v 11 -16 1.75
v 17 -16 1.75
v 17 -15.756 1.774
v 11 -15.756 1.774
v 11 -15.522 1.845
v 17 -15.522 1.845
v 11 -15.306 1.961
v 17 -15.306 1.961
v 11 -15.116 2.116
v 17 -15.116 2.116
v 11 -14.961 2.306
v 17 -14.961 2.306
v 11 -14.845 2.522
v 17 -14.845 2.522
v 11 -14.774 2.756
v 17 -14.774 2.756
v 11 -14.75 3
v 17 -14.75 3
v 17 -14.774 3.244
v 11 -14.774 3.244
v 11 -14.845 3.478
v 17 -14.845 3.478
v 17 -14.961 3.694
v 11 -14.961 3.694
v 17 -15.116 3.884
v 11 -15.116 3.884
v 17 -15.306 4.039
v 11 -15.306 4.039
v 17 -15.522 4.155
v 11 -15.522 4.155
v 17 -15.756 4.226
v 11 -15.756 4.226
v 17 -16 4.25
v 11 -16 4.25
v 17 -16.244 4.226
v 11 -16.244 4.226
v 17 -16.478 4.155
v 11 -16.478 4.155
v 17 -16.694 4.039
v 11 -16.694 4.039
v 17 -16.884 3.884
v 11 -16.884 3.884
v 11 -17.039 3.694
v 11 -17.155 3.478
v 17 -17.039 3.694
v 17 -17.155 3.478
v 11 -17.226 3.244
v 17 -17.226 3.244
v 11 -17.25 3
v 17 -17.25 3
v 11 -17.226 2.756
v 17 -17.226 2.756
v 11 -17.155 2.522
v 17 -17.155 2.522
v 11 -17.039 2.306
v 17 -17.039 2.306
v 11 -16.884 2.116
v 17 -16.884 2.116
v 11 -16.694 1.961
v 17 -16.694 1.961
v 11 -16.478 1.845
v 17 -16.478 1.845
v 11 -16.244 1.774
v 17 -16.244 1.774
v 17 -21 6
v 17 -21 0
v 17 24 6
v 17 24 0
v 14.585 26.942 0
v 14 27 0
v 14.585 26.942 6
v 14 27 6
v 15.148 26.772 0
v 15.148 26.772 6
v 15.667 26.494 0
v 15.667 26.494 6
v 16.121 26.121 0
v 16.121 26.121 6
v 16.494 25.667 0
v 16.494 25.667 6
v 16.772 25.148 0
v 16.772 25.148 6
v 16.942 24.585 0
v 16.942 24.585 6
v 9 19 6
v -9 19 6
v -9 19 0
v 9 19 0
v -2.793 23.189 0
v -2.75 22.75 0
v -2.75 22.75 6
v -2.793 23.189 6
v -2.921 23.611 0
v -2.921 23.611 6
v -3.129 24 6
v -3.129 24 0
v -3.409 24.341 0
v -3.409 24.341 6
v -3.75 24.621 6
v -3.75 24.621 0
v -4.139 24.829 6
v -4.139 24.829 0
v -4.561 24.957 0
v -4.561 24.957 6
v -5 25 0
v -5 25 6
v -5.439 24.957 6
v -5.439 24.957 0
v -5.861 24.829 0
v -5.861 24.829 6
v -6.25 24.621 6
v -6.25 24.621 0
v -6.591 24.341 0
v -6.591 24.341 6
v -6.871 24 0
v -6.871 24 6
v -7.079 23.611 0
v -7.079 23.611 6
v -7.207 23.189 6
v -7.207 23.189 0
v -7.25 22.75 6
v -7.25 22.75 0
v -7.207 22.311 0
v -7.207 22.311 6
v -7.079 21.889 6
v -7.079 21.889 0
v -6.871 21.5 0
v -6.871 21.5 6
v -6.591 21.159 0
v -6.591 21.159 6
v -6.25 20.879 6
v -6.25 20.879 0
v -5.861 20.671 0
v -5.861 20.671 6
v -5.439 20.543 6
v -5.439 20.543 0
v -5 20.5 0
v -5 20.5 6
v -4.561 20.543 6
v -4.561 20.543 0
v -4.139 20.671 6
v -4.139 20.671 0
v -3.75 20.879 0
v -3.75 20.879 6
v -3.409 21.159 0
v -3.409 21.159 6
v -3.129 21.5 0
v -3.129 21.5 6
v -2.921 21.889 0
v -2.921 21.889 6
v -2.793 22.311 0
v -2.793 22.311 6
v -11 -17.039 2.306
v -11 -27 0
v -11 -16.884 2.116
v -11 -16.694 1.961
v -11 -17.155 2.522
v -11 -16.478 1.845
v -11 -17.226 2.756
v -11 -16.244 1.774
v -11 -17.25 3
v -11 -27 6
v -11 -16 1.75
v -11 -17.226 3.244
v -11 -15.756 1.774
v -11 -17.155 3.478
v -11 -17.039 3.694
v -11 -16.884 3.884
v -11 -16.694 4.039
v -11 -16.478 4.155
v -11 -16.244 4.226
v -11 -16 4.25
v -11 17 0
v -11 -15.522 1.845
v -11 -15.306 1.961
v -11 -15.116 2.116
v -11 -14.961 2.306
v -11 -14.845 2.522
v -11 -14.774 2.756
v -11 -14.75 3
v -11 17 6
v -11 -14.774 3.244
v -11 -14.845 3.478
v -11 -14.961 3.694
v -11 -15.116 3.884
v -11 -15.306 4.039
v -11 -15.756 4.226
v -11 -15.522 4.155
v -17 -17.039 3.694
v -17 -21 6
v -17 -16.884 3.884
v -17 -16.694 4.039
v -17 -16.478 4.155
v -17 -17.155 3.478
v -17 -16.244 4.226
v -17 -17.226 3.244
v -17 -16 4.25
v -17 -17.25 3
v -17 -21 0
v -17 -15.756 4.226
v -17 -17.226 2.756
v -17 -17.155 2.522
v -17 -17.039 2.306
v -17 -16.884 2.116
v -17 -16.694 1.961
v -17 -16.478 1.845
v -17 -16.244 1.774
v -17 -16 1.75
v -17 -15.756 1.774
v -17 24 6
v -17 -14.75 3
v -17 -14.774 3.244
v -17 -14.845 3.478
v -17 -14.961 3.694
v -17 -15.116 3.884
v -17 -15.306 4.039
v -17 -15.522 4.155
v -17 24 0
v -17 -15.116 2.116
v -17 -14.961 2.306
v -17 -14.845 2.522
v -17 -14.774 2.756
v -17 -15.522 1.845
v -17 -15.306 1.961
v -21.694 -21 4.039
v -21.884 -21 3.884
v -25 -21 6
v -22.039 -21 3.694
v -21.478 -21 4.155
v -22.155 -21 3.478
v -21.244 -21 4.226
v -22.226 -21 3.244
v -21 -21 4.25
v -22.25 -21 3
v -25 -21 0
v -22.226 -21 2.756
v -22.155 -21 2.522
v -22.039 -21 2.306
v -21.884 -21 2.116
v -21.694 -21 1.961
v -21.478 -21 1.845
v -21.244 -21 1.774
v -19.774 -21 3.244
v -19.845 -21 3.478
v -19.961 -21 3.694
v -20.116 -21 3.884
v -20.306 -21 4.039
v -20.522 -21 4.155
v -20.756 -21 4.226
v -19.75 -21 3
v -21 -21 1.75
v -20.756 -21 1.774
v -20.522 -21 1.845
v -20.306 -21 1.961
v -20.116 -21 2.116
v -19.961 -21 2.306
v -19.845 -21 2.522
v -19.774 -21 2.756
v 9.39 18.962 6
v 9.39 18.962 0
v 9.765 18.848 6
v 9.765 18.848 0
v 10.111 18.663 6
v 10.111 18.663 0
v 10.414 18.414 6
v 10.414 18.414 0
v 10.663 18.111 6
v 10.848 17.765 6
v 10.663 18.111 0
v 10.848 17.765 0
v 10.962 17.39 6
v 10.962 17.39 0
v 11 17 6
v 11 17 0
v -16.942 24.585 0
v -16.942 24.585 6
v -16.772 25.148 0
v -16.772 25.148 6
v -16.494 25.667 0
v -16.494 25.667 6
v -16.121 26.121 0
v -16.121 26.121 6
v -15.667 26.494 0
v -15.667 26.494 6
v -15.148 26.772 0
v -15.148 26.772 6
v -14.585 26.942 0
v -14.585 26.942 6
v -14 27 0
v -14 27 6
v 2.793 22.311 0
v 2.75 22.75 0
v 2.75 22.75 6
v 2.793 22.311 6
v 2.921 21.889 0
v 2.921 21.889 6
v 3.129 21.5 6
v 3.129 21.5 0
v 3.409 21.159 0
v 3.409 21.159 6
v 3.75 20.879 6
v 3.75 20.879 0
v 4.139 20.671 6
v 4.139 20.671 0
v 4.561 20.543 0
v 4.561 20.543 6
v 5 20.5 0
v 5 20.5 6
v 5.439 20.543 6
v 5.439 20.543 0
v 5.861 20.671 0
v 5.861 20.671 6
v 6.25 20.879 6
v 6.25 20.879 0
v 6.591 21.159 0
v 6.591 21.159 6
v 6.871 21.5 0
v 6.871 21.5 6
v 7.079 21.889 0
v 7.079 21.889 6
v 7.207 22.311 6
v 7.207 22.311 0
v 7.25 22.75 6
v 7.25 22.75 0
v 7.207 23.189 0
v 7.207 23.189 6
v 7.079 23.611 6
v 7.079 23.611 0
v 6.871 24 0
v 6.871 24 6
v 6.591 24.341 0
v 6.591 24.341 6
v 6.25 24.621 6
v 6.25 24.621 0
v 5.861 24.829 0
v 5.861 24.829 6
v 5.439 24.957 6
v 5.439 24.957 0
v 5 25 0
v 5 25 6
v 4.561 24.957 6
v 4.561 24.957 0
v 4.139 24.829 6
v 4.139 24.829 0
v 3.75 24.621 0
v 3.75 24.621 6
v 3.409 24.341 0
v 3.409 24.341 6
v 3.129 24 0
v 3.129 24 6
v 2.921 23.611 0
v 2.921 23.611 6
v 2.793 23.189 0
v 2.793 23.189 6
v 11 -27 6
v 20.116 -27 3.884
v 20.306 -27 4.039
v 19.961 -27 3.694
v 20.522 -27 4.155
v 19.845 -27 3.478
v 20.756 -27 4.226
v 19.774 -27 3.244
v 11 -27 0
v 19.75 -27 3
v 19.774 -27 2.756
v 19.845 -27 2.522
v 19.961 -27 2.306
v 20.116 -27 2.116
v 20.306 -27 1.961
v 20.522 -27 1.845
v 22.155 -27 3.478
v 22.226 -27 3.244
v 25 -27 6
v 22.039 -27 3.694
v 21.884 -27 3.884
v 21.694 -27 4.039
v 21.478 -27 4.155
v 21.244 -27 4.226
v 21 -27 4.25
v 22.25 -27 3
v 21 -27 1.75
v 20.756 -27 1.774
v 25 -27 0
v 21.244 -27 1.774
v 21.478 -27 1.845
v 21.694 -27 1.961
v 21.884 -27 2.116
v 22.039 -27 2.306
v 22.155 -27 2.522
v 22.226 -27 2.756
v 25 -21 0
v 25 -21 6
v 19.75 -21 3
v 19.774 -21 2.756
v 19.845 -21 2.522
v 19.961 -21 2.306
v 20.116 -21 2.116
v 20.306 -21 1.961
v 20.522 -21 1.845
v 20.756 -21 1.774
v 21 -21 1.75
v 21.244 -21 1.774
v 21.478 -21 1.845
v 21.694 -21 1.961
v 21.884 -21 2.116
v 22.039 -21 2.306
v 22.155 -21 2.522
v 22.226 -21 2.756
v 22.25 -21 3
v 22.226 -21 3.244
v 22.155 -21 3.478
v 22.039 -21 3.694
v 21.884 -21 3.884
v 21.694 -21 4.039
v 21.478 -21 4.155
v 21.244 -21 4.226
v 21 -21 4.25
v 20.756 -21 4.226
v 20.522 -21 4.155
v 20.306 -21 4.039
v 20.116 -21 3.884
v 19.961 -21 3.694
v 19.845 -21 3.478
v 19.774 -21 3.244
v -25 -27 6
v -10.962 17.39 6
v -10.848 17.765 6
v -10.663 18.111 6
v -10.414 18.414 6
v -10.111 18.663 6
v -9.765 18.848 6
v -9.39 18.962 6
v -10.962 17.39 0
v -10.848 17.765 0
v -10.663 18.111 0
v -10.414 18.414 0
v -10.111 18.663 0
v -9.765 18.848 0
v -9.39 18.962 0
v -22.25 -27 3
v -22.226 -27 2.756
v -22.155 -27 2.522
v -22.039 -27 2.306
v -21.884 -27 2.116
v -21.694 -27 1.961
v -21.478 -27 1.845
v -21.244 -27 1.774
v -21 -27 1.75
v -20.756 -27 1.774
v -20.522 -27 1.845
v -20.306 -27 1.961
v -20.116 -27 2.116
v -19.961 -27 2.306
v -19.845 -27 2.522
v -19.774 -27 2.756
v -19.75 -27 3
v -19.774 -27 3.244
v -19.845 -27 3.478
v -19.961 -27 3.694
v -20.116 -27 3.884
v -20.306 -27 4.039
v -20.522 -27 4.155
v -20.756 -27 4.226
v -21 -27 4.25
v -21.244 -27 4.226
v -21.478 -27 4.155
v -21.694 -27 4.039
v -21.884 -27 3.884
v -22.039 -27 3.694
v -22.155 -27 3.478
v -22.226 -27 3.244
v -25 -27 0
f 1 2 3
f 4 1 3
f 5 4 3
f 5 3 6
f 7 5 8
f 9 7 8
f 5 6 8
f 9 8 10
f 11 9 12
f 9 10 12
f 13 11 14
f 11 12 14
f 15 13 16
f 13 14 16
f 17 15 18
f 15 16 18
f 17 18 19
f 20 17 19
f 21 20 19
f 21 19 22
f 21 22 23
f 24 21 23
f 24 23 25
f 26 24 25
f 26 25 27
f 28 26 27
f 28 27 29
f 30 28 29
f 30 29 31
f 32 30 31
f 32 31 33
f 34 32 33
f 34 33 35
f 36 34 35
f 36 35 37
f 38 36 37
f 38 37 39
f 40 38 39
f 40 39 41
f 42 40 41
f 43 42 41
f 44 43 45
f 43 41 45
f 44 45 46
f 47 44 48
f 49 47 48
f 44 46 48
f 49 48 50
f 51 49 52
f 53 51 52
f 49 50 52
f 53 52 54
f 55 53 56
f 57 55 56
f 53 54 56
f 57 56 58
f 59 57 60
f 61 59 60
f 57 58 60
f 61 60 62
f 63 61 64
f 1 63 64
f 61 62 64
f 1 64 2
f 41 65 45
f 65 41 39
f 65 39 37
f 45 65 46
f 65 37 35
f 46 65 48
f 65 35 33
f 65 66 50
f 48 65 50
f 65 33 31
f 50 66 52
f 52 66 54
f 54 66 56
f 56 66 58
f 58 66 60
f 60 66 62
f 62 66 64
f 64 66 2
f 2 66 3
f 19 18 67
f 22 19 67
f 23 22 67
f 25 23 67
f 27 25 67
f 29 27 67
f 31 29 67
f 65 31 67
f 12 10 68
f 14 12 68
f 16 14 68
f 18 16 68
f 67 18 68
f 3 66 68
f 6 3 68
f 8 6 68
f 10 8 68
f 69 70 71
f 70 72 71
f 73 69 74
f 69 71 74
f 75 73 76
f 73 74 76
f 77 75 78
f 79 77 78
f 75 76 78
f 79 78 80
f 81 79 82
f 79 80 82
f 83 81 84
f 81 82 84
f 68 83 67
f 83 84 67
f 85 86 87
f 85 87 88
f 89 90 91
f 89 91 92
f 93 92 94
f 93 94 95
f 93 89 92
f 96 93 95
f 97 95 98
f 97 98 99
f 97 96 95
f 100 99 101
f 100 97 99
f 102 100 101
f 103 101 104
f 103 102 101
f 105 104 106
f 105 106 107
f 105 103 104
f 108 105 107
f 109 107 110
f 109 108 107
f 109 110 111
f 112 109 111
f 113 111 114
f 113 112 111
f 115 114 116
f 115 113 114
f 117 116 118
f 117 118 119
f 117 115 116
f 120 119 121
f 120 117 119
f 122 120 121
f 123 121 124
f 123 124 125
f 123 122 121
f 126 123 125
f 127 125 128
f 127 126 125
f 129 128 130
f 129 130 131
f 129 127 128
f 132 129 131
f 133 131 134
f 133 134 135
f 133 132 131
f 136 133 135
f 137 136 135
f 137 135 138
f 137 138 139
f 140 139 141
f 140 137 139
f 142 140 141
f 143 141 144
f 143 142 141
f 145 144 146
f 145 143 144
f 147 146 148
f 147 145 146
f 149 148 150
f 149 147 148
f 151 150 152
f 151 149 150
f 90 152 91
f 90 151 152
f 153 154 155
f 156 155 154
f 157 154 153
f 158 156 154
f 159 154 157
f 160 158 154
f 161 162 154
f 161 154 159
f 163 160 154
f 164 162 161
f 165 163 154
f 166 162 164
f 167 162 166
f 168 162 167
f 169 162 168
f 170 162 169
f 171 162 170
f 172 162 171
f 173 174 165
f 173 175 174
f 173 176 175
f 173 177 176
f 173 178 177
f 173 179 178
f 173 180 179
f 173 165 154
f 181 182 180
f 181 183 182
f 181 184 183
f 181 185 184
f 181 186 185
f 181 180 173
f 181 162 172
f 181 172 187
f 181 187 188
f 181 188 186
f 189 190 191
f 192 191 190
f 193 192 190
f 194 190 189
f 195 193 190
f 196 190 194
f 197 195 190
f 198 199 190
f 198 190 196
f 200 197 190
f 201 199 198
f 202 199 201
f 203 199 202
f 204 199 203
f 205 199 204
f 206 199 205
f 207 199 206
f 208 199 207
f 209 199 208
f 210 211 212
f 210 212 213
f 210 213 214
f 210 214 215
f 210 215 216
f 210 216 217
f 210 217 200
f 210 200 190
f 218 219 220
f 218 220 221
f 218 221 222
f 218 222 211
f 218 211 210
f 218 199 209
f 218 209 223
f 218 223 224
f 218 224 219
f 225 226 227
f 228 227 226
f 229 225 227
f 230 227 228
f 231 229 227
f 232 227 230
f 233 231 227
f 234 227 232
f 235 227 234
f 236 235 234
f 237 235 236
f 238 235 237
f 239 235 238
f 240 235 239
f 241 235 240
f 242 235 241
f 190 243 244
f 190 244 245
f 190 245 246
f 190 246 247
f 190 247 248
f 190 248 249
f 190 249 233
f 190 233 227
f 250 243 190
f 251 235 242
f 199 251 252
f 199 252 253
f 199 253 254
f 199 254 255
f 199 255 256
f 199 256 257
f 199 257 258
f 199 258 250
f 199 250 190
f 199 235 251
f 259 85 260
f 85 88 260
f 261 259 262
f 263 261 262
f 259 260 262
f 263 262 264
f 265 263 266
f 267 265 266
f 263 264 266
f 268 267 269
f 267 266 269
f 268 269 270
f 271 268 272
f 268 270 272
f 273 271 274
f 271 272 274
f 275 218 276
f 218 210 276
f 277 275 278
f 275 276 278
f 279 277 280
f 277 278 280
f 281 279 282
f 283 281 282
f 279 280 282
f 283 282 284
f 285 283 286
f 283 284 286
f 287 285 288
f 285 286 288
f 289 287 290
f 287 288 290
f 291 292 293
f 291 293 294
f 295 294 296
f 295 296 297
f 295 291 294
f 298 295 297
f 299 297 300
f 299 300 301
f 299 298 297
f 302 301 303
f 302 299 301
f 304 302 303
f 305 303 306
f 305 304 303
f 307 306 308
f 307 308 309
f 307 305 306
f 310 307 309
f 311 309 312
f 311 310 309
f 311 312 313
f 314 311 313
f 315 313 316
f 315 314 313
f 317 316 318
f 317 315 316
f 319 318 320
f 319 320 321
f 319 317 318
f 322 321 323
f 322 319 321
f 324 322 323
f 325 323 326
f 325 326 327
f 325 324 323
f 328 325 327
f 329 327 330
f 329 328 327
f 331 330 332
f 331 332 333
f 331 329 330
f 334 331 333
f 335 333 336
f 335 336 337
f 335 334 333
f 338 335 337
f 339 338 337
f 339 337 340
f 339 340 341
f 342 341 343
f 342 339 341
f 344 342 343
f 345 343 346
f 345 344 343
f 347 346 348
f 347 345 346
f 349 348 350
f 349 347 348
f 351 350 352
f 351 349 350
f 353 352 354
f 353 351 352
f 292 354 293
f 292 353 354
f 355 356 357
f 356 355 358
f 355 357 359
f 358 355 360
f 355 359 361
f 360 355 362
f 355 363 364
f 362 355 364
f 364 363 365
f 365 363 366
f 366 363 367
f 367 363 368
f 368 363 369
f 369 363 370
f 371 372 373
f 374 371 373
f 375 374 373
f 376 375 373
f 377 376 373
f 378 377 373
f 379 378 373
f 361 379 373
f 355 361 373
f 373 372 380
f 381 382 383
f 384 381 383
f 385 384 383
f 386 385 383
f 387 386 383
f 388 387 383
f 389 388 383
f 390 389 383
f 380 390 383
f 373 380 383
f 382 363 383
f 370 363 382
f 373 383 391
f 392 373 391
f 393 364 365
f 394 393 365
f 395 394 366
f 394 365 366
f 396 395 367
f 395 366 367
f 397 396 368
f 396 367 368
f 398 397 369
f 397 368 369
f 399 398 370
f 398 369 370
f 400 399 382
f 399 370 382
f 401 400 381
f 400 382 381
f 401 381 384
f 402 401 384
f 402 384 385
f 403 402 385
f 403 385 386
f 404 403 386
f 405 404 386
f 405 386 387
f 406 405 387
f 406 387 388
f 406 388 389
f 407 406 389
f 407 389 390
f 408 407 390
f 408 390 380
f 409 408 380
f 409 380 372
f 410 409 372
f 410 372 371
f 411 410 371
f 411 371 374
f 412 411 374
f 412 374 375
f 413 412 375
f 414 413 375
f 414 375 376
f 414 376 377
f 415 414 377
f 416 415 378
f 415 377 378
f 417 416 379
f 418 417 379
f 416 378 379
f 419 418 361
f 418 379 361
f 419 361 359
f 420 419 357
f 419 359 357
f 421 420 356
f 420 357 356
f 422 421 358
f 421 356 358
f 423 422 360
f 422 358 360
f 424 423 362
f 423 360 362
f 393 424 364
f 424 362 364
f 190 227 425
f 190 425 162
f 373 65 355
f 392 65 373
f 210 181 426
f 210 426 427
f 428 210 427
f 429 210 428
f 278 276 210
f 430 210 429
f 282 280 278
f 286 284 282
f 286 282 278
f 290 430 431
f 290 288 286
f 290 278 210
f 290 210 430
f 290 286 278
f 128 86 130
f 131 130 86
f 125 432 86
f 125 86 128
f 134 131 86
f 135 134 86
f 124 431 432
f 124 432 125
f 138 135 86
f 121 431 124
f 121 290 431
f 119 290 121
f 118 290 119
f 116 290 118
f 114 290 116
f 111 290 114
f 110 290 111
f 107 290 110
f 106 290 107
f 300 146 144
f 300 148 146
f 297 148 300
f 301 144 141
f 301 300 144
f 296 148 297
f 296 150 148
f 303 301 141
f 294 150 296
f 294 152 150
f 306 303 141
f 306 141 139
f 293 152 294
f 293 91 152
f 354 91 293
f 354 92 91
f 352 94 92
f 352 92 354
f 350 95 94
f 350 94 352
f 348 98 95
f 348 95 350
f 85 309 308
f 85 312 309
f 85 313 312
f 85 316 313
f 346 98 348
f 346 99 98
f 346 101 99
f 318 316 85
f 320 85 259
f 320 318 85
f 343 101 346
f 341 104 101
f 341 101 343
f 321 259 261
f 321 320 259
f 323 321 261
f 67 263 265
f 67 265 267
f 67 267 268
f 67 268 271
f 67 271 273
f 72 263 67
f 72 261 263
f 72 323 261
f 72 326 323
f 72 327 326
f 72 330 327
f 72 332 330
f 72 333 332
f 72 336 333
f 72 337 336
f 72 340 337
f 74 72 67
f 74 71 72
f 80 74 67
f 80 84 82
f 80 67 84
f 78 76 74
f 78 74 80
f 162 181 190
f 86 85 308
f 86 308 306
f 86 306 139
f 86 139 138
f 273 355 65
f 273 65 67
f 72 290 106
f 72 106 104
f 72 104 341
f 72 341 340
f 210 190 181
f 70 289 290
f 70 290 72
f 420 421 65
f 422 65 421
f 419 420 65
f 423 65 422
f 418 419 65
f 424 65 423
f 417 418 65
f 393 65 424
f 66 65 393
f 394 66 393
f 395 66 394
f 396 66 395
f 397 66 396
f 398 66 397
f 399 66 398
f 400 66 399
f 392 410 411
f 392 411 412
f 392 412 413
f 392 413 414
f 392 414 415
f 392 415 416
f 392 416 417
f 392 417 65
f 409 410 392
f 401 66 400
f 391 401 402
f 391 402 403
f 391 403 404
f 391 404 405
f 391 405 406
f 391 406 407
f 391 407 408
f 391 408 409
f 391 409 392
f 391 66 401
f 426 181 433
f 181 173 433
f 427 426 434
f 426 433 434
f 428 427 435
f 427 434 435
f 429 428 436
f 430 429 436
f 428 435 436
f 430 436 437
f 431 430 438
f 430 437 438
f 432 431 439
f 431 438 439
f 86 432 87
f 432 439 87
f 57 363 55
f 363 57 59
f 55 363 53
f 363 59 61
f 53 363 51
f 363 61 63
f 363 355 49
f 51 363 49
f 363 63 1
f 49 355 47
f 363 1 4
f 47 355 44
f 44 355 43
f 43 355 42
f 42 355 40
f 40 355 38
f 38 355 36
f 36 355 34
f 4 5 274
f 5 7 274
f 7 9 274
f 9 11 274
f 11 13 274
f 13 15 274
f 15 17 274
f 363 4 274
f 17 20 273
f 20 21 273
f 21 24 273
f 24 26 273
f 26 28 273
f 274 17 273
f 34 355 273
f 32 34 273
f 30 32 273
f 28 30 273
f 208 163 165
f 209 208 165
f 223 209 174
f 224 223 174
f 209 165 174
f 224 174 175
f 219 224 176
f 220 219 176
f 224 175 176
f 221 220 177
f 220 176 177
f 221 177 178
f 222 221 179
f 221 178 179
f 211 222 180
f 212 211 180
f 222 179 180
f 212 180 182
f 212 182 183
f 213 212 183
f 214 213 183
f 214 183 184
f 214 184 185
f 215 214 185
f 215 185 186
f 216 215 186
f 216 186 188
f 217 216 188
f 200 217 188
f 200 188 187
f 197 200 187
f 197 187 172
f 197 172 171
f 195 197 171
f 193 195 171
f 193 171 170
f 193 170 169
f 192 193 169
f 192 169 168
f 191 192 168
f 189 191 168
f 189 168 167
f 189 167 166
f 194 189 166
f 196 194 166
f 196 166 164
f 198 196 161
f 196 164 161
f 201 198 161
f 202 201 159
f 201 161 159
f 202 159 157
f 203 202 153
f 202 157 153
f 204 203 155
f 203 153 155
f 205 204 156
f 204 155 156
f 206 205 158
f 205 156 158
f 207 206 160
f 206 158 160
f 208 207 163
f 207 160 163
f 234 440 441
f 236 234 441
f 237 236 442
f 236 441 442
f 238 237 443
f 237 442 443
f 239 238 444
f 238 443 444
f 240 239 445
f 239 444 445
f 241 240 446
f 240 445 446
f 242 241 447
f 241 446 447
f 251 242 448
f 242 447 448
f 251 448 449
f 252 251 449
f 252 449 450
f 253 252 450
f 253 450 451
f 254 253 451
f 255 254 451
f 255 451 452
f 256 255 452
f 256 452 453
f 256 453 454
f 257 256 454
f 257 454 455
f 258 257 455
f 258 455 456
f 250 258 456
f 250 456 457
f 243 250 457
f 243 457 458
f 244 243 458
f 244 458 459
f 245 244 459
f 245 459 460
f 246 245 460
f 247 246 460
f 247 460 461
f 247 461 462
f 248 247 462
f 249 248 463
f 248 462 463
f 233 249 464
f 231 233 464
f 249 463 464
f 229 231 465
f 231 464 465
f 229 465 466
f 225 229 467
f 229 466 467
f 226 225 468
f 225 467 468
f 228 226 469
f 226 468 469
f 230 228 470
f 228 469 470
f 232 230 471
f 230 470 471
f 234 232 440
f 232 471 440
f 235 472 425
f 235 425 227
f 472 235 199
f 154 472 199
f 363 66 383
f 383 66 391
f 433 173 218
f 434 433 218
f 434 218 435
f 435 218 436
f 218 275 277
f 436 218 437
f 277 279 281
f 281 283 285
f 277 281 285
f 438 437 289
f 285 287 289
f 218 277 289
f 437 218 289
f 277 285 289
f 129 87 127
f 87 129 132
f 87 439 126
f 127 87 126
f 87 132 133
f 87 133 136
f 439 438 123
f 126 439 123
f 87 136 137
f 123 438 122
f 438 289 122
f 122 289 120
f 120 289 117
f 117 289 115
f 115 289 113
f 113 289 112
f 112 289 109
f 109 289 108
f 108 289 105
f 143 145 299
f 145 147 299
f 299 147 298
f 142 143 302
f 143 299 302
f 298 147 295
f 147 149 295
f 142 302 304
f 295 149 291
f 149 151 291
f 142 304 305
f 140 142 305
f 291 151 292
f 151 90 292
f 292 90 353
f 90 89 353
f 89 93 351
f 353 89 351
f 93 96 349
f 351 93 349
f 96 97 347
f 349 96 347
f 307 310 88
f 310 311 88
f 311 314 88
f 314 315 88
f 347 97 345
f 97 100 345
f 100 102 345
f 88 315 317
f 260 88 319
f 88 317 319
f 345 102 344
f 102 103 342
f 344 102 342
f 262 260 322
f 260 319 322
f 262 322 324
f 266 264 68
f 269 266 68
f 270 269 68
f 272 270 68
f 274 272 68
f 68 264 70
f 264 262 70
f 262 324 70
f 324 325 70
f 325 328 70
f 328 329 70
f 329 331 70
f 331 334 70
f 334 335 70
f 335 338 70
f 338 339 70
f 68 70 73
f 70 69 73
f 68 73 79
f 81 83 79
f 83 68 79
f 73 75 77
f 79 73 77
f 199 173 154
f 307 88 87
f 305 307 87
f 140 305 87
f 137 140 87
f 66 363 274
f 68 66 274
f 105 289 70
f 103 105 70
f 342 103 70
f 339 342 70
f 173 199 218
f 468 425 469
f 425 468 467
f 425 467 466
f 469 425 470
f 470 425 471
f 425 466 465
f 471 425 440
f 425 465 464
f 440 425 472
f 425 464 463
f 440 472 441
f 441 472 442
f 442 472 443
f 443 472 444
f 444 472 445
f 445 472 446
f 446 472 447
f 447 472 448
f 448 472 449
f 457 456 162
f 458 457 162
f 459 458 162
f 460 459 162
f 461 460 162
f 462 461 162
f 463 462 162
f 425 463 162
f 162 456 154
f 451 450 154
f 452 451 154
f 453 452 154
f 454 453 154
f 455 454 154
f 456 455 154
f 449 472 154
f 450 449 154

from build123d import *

# Parameters (mm, degrees)
SKETCH_1_W             = 34
SKETCH_1_H             = 54
SKETCH_1_R             = 2.25
EXTRUDE_1_DEPTH        = 6
SKETCH_4_W             = 8
SKETCH_4_H             = 6
EXTRUDE_2_DEPTH        = 6
SKETCH_2_W             = 22
SKETCH_2_H             = 46
CUT_EXTRUDE_1_DEPTH    = 10
FILLET_1_R             = 3
FILLET_2_R             = 2
HOLE_WIZARD_M3_1_D     = 2.5
HOLE_WIZARD_M3_1_DEPTH = 7.5
HOLE_WIZARD_M3_1_TIP   = 0.751075774
HOLE_WIZARD_M3_2_D     = 2.5
HOLE_WIZARD_M3_2_DEPTH = 101.5
HOLE_WIZARD_M3_2_TIP   = 0.751075774


with BuildPart() as part:
    # 草图1 → 凸台-拉伸1 (new body)
    with BuildSketch(Plane.XY):
        Rectangle(SKETCH_1_W, SKETCH_1_H)
        with Locations((-5, 22.75)):
            Circle(SKETCH_1_R, mode=Mode.SUBTRACT)
        with Locations(Location((5, 22.75, 0), (0, 0, 180))):
            Circle(SKETCH_1_R, mode=Mode.SUBTRACT)
    extrude(amount=EXTRUDE_1_DEPTH)

    # 草图4 → 凸台-拉伸2 (add)
    with BuildSketch(Plane.XY):
        with Locations((21, -24)):
            Rectangle(SKETCH_4_W, SKETCH_4_H)
        with Locations((-21, -24)):
            Rectangle(SKETCH_4_W, SKETCH_4_H)
    extrude(amount=EXTRUDE_2_DEPTH)

    # 草图2 → 切除-拉伸1 (cut)
    with BuildSketch(Plane.XY.offset(6)):
        with Locations((0, -4)):
            Rectangle(SKETCH_2_W, SKETCH_2_H)
    extrude(amount=-CUT_EXTRUDE_1_DEPTH, mode=Mode.SUBTRACT)

    # 圆角1
    fillet_1_edges = [part.edges().sort_by_distance(p)[0] for p in [
        (-17, 27, 3),
        (17, 27, 3),
    ]]
    fillet(fillet_1_edges, radius=FILLET_1_R)

    # 圆角2
    fillet_2_edges = [part.edges().sort_by_distance(p)[0] for p in [
        (-11, 19, 3),
        (11, 19, 3),
    ]]
    fillet(fillet_2_edges, radius=FILLET_2_R)

    # M3 螺纹孔1
    with Locations(Plane(origin=(0, -21, 0), x_dir=(1, 0, 0), z_dir=(0, 1, 0))):
        with Locations((-21, -3), (21, -3)):
            Hole(HOLE_WIZARD_M3_1_D / 2, depth=HOLE_WIZARD_M3_1_DEPTH)
            with Locations((0, 0, -(HOLE_WIZARD_M3_1_DEPTH + HOLE_WIZARD_M3_1_TIP / 2))):  # 118° drill point
                Cone(0, HOLE_WIZARD_M3_1_D / 2, HOLE_WIZARD_M3_1_TIP, mode=Mode.SUBTRACT)

    # M3 螺纹孔2
    with Locations(Plane.ZY.offset(17)):
        with Locations((3, -16)):
            Hole(HOLE_WIZARD_M3_2_D / 2, depth=HOLE_WIZARD_M3_2_DEPTH)
            with Locations((0, 0, -(HOLE_WIZARD_M3_2_DEPTH + HOLE_WIZARD_M3_2_TIP / 2))):  # 118° drill point
                Cone(0, HOLE_WIZARD_M3_2_D / 2, HOLE_WIZARD_M3_2_TIP, mode=Mode.SUBTRACT)


solid = part.part
